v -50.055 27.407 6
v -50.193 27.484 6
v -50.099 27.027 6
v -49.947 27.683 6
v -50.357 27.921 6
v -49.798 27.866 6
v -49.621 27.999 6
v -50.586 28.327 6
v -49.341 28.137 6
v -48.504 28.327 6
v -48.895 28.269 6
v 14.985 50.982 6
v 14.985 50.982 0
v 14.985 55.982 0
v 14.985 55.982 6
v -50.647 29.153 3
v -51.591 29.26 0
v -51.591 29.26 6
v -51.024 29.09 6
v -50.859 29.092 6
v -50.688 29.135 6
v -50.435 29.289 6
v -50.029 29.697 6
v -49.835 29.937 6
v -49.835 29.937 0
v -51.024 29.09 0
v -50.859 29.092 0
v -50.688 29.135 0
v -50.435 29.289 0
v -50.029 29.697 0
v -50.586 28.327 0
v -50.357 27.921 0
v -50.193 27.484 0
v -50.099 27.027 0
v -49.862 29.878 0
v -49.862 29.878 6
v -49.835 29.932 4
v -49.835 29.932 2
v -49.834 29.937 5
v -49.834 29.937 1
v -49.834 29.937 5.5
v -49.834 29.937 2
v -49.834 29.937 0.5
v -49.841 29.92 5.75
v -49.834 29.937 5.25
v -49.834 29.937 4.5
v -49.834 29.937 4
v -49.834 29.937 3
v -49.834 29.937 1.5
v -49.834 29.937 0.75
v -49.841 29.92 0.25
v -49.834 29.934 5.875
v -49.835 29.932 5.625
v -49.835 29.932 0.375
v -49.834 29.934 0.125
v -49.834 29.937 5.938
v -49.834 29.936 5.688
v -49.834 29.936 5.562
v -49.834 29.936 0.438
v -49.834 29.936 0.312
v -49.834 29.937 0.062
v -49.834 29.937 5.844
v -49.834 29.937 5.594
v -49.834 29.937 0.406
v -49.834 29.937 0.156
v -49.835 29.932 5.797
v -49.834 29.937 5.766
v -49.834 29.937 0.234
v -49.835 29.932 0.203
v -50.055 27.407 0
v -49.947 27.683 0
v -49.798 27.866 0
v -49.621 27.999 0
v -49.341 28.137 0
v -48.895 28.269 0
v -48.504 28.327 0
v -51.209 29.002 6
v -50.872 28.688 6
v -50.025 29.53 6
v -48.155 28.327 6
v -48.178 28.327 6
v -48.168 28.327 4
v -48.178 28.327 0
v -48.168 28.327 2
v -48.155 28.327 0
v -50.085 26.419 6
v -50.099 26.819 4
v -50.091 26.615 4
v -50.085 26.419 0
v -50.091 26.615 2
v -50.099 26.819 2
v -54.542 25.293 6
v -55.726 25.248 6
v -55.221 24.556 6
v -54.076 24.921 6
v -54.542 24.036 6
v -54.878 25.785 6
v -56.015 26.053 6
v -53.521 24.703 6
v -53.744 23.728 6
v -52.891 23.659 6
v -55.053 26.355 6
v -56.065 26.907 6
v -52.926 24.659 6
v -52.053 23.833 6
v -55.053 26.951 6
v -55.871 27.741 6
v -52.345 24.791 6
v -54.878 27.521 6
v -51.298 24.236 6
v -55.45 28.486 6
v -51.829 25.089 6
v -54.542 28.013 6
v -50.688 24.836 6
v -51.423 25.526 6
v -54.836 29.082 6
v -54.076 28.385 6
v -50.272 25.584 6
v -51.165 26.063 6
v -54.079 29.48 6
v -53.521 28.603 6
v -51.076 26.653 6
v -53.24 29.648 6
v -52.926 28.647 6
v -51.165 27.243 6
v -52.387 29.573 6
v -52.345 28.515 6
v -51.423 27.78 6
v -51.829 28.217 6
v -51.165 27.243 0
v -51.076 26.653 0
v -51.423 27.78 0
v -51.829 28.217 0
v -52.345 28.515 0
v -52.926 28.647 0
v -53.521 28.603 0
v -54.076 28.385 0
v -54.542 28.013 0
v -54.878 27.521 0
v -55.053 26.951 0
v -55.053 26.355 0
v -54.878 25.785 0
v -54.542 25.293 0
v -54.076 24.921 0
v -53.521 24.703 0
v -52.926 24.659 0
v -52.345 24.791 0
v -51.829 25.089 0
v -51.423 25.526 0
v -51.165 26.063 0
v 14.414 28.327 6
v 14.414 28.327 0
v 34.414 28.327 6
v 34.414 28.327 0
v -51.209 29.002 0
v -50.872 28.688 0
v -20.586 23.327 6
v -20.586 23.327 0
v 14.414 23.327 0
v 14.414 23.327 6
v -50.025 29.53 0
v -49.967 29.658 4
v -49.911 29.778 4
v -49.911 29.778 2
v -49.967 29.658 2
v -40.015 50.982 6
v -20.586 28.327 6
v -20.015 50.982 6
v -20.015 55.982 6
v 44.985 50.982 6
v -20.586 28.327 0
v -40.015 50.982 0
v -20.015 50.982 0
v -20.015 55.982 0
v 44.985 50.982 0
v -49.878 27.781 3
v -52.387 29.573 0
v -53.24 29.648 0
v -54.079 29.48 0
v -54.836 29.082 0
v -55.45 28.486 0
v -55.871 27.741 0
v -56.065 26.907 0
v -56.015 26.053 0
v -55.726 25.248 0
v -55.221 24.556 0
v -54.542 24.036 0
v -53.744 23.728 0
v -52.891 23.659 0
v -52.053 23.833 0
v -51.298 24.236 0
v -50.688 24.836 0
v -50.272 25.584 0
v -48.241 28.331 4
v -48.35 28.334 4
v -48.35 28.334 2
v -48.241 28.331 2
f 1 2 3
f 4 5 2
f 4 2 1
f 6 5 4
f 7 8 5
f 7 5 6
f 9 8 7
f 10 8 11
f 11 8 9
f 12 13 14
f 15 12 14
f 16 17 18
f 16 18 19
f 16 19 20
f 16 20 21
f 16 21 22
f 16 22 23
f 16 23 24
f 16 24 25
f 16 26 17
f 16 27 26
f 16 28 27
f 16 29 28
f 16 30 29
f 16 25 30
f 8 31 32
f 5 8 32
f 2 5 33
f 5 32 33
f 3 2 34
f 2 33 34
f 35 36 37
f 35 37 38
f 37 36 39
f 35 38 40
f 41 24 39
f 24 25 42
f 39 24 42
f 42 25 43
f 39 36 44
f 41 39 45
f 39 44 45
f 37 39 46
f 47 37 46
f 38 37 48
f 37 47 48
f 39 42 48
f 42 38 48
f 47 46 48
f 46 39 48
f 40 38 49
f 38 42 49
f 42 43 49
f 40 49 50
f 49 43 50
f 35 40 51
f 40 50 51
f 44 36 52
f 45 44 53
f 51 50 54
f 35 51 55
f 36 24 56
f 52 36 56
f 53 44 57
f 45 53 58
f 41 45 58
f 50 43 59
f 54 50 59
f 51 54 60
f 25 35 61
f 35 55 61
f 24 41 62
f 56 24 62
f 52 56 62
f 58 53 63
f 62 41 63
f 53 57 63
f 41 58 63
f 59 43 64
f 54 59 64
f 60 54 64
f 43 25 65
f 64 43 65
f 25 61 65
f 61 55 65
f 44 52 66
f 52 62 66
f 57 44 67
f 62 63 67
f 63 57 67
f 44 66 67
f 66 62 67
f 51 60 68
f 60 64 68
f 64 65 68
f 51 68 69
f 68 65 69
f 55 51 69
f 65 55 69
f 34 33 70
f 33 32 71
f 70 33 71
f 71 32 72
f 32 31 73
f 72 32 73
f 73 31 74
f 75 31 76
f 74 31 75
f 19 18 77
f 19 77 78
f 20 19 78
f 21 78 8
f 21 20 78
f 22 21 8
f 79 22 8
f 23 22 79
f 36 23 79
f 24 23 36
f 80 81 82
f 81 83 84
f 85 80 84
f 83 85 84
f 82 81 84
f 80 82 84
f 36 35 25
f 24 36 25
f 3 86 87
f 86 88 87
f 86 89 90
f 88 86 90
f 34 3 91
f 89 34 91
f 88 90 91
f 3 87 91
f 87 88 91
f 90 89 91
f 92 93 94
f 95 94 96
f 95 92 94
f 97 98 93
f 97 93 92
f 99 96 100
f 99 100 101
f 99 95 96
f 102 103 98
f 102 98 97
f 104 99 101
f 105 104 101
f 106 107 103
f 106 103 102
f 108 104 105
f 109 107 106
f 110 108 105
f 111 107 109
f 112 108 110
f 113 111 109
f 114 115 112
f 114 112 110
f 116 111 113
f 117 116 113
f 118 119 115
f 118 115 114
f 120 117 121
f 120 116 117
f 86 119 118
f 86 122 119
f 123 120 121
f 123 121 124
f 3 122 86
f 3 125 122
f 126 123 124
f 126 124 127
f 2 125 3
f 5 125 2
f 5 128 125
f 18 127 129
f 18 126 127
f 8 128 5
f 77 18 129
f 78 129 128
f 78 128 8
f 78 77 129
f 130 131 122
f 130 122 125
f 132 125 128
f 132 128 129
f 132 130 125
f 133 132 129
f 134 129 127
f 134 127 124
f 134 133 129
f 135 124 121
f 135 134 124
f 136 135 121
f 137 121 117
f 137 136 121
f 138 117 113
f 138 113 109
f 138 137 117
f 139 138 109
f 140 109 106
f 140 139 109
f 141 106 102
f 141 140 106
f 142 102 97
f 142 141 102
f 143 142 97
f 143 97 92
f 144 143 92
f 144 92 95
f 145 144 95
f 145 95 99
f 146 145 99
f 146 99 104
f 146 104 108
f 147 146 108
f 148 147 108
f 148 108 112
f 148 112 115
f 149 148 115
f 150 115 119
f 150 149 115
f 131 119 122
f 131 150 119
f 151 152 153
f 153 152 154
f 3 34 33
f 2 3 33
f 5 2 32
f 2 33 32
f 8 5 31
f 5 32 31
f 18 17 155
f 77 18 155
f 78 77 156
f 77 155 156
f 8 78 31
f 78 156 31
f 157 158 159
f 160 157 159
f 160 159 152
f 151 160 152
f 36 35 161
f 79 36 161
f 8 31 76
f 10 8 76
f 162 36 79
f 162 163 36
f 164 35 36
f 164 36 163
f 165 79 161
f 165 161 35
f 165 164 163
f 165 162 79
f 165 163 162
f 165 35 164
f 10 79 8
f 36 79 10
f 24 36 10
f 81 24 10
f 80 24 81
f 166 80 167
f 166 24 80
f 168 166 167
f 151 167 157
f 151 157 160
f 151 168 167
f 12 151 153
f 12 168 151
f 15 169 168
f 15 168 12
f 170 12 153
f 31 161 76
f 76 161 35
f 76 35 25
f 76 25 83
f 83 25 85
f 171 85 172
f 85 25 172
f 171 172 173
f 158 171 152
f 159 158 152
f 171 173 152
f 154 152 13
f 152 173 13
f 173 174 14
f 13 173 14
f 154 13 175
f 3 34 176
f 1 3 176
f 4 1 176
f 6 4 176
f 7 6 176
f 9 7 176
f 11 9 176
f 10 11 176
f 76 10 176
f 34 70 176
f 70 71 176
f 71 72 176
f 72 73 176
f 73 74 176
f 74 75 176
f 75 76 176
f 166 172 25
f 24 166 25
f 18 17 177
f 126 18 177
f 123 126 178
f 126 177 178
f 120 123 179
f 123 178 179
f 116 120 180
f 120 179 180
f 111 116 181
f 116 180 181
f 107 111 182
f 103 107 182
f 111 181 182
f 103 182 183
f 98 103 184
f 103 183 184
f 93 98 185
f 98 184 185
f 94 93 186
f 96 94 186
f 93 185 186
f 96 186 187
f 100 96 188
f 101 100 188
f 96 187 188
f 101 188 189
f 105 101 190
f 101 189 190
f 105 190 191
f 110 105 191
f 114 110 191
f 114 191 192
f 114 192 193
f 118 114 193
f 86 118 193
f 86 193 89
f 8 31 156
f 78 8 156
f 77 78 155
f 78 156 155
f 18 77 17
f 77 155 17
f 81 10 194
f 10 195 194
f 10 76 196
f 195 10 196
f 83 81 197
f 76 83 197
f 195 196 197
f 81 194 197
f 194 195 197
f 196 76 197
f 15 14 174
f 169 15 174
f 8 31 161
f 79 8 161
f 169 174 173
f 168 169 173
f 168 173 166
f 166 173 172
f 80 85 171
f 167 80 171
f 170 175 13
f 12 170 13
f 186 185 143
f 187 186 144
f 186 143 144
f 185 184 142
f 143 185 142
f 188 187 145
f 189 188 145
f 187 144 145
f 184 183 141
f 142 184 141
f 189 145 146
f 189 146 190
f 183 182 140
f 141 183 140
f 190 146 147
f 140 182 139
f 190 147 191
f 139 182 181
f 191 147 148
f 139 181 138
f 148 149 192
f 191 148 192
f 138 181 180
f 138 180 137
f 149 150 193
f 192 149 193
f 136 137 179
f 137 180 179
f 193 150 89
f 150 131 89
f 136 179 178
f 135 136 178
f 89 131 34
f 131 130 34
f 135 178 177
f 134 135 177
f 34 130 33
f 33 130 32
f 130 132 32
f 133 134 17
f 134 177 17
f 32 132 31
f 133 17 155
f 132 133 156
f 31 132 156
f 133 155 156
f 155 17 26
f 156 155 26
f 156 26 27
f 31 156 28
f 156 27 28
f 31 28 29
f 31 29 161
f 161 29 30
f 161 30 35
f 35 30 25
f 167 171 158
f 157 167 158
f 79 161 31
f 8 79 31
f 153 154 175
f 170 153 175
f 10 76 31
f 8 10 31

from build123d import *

# Parameters (mm, degrees)
F1_DEPTH = 6
F0_R     = 2
F2_DEPTH = 6


with BuildPart() as f1:
    # F0 (on Top) → F1 (new body)
    with BuildSketch(Plane.XY):
        with BuildLine():
            Line((-50.0249465513, 29.52996234), (-50.5862181266, 28.3271253868))
            Line((-50.5862181266, 28.3271253868), (-48.5040023923, 28.3271253868))
            add(Edge.make_bspline(
                [(-48.5040023923, 28.3271253868), (-48.3265830997, 28.3410976173), (-48.2191282446, 28.3290178572), (-48.177883029, 28.3271253868)],
                knots=[0.7675517488, 0.7675517488, 0.7675517488, 0.7675517488, 0.9509774258, 0.9509774258, 0.9509774258, 0.9509774258], degree=3))
            Line((-48.177883029, 28.3271253868), (-48.1545887887, 28.3271253868))
            Line((-48.1545887887, 28.3271253868), (-20.5862181266, 28.3271253868))
            Line((-20.5862181266, 28.3271253868), (-20.5862181266, 23.3271253868))
            Line((-20.5862181266, 23.3271253868), (14.4137818734, 23.3271253868))
            Line((14.4137818734, 23.3271253868), (14.4137818734, 28.3271253868))
            Line((14.4137818734, 28.3271253868), (34.4137818734, 28.3271253868))
            Line((34.4137818734, 28.3271253868), (44.9851090482, 50.9820816164))
            Line((44.9851090482, 50.9820816164), (14.9851090482, 50.9820816164))
            Line((14.9851090482, 50.9820816164), (14.9851090482, 55.9820816164))
            Line((14.9851090482, 55.9820816164), (-20.0148909518, 55.9820816164))
            Line((-20.0148909518, 55.9820816164), (-20.0148909518, 50.9820816164))
            Line((-20.0148909518, 50.9820816164), (-40.0148909518, 50.9820816164))
            Line((-40.0148909518, 50.9820816164), (-49.8350928217, 29.9368296959))
            add(Edge.make_bspline(
                [(-49.8350928217, 29.9368296959), (-49.8287783598, 29.9415238557), (-49.8442396119, 29.9138038591), (-49.8624208334, 29.8782642102)],
                knots=[0.6997217006, 0.6997217006, 0.6997217006, 0.6997217006, 0.7870450964, 0.7870450964, 0.7870450964, 0.7870450964], degree=3))
            Line((-49.8624208334, 29.8782642102), (-50.0249465513, 29.52996234))
        make_face()
    extrude(amount=F1_DEPTH)

    # F0 (on Top) → F2, piece 3 (join)
    with BuildSketch(Plane.XY):
        with BuildLine():
            Line((-48.1545887887, 28.3271253868), (-48.177883029, 28.3271253868))
            add(Edge.make_bspline(
                [(-48.177883029, 28.3271253868), (-48.1668597814, 28.3266196028), (-48.1605657938, 28.3268414823), (-48.1545887887, 28.3271253868)],
                knots=[0.9509774258, 0.9509774258, 0.9509774258, 0.9509774258, 1, 1, 1, 1], degree=3))
        make_face()
    extrude(amount=F2_DEPTH)


with BuildPart() as f1b:
    # F0 (on Top) → F1, piece 2 (new body)
    with BuildSketch(Plane.XY):
        with BuildLine():
            ThreePointArc((-50.0990342752, 27.0268241237), (-50.2663592156, 27.7055497053), (-50.5862181266, 28.3271253868))
            ThreePointArc((-50.5862181266, 28.3271253868), (-51.0346189675, 28.851670583), (-51.5910155934, 29.2598785833))
            ThreePointArc((-51.5910155934, 29.2598785833), (-55.7260895801, 25.2475821047), (-50.0847692352, 26.4192751848))
            add(Edge.make_bspline(
                [(-50.0847692352, 26.4192751848), (-50.0886085443, 26.6089058035), (-50.1045665089, 26.8197544117), (-50.0990342752, 27.0268241237)],
                knots=[0, 0, 0, 0, 0.1607658778, 0.1607658778, 0.1607658778, 0.1607658778], degree=3))
        make_face()
        with Locations((-53.0756514359, 26.6529922385)):
            Circle(F0_R, mode=Mode.SUBTRACT)
    extrude(amount=F1_DEPTH)


with BuildPart() as f2:
    # F0 (on Top) → F2 (new body)
    with BuildSketch(Plane.XY):
        with BuildLine():
            ThreePointArc((-51.5910155934, 29.2598785833), (-51.0346189675, 28.851670583), (-50.5862181266, 28.3271253868))
            Line((-50.5862181266, 28.3271253868), (-50.0249465513, 29.52996234))
            add(Edge.make_bspline(
                [(-49.8624208334, 29.8782642102), (-49.9067592406, 29.7915939378), (-49.9672739064, 29.6584184674), (-50.0249465513, 29.52996234)],
                knots=[0.7870450964, 0.7870450964, 0.7870450964, 0.7870450964, 1, 1, 1, 1], degree=3))
            Line((-49.8624208334, 29.8782642102), (-49.8350928217, 29.9368296959))
            add(Edge.make_bspline(
                [(-51.5910155934, 29.2598785833), (-51.3183012558, 29.1677802311), (-50.6411432567, 28.7943490334), (-49.8614766476, 29.9172160064), (-49.8350928217, 29.9368296959)],
                knots=[0, 0, 0, 0, 0.3348568359, 0.6997217006, 0.6997217006, 0.6997217006, 0.6997217006], degree=3))
        make_face()
    extrude(amount=F2_DEPTH)


with BuildPart() as f2b:
    # F0 (on Top) → F2, piece 2 (new body)
    with BuildSketch(Plane.XY):
        with BuildLine():
            Line((-48.5040023923, 28.3271253868), (-50.5862181266, 28.3271253868))
            ThreePointArc((-50.5862181266, 28.3271253868), (-50.2663592156, 27.7055497053), (-50.0990342752, 27.0268241237))
            add(Edge.make_bspline(
                [(-50.0990342752, 27.0268241237), (-50.091596006, 27.3052361266), (-49.9616584893, 28.0676117598), (-48.8818418367, 28.2973695484), (-48.5040023923, 28.3271253868)],
                knots=[0.1607658778, 0.1607658778, 0.1607658778, 0.1607658778, 0.3769208605, 0.7675517488, 0.7675517488, 0.7675517488, 0.7675517488], degree=3))
        make_face()
    extrude(amount=F2_DEPTH)


solid = Compound([f1.part, f1b.part, f2.part, f2b.part])
